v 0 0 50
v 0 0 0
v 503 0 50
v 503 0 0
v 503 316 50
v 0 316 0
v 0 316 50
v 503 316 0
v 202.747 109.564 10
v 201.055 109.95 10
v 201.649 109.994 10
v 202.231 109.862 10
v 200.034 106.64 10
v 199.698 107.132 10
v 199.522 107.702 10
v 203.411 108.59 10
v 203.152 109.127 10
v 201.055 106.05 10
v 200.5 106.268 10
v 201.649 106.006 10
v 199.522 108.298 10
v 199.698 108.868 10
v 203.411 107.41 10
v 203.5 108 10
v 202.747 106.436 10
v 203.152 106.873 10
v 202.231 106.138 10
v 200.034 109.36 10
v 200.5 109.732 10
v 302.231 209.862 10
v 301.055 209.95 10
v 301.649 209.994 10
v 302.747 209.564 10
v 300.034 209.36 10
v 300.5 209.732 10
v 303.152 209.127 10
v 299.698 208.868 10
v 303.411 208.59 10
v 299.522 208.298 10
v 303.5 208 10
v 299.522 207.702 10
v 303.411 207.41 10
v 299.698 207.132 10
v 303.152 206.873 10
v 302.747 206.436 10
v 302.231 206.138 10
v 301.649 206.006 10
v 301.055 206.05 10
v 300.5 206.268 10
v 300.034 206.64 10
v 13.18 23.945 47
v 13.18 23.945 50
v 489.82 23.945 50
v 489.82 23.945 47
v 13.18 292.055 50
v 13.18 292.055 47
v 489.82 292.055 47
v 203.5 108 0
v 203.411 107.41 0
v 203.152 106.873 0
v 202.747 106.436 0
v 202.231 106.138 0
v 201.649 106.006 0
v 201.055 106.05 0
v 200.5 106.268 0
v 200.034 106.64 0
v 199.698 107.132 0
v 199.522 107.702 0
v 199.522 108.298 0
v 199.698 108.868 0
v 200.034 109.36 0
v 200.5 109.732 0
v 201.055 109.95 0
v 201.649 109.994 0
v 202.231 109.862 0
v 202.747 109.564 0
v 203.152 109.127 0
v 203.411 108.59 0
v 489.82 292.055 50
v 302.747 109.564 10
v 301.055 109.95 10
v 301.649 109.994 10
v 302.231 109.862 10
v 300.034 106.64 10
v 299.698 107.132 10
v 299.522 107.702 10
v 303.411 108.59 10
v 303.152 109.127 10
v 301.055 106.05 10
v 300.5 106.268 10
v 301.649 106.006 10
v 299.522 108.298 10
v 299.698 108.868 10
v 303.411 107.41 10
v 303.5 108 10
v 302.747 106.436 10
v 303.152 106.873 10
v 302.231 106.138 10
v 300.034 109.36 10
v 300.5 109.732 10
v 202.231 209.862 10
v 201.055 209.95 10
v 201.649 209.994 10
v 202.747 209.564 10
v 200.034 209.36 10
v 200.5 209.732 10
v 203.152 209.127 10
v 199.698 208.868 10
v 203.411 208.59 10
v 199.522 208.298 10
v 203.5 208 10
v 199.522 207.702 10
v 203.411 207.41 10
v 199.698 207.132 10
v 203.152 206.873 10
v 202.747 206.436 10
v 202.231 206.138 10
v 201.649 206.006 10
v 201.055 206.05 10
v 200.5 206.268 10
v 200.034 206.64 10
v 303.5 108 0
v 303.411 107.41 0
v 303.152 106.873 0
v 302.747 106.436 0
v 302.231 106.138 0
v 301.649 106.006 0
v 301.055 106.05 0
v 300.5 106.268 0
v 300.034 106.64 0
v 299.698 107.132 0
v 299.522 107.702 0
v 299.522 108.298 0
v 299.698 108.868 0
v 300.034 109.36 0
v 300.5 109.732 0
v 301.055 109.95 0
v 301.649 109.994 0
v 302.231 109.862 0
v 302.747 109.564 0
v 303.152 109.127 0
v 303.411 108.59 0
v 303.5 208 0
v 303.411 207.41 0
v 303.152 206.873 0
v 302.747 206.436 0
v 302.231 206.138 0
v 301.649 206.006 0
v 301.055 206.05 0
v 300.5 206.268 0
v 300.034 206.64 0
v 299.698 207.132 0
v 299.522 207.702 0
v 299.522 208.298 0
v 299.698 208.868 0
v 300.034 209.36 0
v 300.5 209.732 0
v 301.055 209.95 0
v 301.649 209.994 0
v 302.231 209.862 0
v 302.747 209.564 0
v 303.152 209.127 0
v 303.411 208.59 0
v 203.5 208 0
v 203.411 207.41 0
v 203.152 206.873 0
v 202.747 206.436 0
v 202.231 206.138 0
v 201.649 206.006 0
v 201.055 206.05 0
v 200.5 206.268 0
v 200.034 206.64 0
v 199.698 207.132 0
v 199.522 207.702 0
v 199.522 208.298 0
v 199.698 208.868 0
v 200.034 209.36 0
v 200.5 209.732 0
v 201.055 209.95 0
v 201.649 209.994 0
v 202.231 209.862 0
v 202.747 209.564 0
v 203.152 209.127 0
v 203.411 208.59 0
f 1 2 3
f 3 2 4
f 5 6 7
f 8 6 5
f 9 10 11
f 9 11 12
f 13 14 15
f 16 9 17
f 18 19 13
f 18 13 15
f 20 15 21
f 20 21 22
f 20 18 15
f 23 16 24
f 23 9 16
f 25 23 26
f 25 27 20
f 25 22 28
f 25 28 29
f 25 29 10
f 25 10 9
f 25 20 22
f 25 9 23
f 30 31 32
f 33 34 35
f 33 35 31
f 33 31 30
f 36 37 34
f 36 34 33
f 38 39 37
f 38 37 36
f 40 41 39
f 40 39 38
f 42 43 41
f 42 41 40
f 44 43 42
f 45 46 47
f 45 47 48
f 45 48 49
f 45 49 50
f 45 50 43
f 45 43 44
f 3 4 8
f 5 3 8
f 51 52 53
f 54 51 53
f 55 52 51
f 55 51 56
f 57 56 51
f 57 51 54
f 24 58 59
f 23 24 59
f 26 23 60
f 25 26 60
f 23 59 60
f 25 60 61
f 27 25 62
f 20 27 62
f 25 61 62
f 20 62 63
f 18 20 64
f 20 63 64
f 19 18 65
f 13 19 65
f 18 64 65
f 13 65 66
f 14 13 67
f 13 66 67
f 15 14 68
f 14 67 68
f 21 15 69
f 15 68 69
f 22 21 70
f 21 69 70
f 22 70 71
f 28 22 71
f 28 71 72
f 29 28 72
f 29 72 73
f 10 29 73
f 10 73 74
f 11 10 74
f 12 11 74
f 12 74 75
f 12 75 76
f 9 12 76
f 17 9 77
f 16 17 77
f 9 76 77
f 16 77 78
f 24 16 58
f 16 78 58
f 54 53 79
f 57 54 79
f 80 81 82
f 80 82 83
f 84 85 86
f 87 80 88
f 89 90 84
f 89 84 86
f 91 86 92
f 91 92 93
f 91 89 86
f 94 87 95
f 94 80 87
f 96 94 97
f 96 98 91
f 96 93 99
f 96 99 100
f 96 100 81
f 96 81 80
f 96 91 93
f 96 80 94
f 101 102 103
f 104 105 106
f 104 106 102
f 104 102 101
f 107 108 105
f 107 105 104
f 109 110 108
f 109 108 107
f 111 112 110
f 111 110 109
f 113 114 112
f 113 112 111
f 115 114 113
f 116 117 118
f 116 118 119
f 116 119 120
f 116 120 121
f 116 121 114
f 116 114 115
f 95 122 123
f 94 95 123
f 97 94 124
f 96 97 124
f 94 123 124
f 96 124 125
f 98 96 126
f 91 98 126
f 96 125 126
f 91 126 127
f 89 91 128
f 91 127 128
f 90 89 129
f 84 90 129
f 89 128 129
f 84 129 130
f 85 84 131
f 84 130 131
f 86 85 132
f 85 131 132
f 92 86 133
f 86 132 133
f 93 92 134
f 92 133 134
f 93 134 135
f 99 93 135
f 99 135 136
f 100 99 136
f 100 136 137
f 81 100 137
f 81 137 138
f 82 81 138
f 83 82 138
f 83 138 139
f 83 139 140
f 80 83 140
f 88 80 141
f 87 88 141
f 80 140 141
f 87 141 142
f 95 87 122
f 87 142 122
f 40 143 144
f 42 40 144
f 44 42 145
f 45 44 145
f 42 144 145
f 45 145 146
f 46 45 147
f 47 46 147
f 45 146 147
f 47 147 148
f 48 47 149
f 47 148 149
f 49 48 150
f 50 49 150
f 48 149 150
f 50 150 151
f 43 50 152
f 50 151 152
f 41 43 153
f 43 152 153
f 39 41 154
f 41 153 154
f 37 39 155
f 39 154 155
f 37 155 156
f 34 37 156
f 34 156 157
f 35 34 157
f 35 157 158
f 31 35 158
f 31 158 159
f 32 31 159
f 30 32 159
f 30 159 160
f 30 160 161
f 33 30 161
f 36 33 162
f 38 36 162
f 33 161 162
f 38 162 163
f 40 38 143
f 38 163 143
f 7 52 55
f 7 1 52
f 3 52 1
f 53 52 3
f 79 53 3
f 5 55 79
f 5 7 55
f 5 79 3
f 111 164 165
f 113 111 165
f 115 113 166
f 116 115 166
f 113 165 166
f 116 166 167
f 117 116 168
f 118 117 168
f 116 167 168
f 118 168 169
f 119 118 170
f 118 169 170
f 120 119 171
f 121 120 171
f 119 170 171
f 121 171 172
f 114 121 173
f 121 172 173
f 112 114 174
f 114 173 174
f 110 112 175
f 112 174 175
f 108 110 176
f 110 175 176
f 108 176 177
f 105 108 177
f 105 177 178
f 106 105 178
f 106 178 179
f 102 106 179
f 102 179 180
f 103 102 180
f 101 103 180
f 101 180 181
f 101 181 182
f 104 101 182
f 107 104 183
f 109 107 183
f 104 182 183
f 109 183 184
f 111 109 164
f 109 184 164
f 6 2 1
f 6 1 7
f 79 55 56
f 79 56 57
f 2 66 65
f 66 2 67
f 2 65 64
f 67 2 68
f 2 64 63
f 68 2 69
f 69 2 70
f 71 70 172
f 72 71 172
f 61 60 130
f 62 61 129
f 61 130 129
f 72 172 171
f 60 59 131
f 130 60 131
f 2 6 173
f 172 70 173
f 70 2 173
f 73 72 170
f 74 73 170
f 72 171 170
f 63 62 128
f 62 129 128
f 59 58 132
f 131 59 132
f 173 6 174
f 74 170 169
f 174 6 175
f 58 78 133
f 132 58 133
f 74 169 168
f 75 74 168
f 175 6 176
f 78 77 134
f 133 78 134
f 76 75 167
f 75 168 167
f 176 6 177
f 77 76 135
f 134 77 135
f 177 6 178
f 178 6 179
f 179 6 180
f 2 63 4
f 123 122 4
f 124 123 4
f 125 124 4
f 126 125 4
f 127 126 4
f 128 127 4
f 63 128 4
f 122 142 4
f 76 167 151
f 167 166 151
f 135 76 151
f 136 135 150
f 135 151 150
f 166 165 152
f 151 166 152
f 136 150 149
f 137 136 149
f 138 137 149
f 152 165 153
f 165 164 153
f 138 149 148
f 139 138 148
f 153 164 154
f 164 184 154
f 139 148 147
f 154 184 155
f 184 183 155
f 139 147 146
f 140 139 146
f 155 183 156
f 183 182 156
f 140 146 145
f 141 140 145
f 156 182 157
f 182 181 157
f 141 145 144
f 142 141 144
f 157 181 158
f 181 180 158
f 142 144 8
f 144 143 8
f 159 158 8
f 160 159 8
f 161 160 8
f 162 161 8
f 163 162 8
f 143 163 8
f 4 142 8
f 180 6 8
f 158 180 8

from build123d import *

# Parameters (mm, degrees)
F0_W     = 503
F0_H     = 316
F1_DEPTH = 50
F2_R     = 2
F3_DEPTH = 10
F4_W     = 476.64
F4_H     = 268.11
F5_DEPTH = 3


with BuildPart() as f1:
    # F0 (on Top) → F1 (new body)
    with BuildSketch(Plane.XY):
        with Locations((251.5, 158)):
            Rectangle(F0_W, F0_H)
    extrude(amount=F1_DEPTH)

    # F2 (on face) → F3 (cut)
    with BuildSketch(Plane(origin=(0, 0, 0), x_dir=(1, 0, 0), z_dir=(0, 0, -1))):
        with Locations((301.5, -208)):
            Circle(F2_R)
        with Locations((201.5, -208)):
            Circle(F2_R)
        with Locations((201.5, -108)):
            Circle(F2_R)
        with Locations((301.5, -108)):
            Circle(F2_R)
    extrude(amount=-F3_DEPTH, mode=Mode.SUBTRACT)

    # F4 (on face) → F5 (cut)
    with BuildSketch(Plane.XY.offset(50)):
        with Locations((251.5, 158)):
            Rectangle(F4_W, F4_H)
    extrude(amount=-F5_DEPTH, mode=Mode.SUBTRACT)


solid = f1.part
